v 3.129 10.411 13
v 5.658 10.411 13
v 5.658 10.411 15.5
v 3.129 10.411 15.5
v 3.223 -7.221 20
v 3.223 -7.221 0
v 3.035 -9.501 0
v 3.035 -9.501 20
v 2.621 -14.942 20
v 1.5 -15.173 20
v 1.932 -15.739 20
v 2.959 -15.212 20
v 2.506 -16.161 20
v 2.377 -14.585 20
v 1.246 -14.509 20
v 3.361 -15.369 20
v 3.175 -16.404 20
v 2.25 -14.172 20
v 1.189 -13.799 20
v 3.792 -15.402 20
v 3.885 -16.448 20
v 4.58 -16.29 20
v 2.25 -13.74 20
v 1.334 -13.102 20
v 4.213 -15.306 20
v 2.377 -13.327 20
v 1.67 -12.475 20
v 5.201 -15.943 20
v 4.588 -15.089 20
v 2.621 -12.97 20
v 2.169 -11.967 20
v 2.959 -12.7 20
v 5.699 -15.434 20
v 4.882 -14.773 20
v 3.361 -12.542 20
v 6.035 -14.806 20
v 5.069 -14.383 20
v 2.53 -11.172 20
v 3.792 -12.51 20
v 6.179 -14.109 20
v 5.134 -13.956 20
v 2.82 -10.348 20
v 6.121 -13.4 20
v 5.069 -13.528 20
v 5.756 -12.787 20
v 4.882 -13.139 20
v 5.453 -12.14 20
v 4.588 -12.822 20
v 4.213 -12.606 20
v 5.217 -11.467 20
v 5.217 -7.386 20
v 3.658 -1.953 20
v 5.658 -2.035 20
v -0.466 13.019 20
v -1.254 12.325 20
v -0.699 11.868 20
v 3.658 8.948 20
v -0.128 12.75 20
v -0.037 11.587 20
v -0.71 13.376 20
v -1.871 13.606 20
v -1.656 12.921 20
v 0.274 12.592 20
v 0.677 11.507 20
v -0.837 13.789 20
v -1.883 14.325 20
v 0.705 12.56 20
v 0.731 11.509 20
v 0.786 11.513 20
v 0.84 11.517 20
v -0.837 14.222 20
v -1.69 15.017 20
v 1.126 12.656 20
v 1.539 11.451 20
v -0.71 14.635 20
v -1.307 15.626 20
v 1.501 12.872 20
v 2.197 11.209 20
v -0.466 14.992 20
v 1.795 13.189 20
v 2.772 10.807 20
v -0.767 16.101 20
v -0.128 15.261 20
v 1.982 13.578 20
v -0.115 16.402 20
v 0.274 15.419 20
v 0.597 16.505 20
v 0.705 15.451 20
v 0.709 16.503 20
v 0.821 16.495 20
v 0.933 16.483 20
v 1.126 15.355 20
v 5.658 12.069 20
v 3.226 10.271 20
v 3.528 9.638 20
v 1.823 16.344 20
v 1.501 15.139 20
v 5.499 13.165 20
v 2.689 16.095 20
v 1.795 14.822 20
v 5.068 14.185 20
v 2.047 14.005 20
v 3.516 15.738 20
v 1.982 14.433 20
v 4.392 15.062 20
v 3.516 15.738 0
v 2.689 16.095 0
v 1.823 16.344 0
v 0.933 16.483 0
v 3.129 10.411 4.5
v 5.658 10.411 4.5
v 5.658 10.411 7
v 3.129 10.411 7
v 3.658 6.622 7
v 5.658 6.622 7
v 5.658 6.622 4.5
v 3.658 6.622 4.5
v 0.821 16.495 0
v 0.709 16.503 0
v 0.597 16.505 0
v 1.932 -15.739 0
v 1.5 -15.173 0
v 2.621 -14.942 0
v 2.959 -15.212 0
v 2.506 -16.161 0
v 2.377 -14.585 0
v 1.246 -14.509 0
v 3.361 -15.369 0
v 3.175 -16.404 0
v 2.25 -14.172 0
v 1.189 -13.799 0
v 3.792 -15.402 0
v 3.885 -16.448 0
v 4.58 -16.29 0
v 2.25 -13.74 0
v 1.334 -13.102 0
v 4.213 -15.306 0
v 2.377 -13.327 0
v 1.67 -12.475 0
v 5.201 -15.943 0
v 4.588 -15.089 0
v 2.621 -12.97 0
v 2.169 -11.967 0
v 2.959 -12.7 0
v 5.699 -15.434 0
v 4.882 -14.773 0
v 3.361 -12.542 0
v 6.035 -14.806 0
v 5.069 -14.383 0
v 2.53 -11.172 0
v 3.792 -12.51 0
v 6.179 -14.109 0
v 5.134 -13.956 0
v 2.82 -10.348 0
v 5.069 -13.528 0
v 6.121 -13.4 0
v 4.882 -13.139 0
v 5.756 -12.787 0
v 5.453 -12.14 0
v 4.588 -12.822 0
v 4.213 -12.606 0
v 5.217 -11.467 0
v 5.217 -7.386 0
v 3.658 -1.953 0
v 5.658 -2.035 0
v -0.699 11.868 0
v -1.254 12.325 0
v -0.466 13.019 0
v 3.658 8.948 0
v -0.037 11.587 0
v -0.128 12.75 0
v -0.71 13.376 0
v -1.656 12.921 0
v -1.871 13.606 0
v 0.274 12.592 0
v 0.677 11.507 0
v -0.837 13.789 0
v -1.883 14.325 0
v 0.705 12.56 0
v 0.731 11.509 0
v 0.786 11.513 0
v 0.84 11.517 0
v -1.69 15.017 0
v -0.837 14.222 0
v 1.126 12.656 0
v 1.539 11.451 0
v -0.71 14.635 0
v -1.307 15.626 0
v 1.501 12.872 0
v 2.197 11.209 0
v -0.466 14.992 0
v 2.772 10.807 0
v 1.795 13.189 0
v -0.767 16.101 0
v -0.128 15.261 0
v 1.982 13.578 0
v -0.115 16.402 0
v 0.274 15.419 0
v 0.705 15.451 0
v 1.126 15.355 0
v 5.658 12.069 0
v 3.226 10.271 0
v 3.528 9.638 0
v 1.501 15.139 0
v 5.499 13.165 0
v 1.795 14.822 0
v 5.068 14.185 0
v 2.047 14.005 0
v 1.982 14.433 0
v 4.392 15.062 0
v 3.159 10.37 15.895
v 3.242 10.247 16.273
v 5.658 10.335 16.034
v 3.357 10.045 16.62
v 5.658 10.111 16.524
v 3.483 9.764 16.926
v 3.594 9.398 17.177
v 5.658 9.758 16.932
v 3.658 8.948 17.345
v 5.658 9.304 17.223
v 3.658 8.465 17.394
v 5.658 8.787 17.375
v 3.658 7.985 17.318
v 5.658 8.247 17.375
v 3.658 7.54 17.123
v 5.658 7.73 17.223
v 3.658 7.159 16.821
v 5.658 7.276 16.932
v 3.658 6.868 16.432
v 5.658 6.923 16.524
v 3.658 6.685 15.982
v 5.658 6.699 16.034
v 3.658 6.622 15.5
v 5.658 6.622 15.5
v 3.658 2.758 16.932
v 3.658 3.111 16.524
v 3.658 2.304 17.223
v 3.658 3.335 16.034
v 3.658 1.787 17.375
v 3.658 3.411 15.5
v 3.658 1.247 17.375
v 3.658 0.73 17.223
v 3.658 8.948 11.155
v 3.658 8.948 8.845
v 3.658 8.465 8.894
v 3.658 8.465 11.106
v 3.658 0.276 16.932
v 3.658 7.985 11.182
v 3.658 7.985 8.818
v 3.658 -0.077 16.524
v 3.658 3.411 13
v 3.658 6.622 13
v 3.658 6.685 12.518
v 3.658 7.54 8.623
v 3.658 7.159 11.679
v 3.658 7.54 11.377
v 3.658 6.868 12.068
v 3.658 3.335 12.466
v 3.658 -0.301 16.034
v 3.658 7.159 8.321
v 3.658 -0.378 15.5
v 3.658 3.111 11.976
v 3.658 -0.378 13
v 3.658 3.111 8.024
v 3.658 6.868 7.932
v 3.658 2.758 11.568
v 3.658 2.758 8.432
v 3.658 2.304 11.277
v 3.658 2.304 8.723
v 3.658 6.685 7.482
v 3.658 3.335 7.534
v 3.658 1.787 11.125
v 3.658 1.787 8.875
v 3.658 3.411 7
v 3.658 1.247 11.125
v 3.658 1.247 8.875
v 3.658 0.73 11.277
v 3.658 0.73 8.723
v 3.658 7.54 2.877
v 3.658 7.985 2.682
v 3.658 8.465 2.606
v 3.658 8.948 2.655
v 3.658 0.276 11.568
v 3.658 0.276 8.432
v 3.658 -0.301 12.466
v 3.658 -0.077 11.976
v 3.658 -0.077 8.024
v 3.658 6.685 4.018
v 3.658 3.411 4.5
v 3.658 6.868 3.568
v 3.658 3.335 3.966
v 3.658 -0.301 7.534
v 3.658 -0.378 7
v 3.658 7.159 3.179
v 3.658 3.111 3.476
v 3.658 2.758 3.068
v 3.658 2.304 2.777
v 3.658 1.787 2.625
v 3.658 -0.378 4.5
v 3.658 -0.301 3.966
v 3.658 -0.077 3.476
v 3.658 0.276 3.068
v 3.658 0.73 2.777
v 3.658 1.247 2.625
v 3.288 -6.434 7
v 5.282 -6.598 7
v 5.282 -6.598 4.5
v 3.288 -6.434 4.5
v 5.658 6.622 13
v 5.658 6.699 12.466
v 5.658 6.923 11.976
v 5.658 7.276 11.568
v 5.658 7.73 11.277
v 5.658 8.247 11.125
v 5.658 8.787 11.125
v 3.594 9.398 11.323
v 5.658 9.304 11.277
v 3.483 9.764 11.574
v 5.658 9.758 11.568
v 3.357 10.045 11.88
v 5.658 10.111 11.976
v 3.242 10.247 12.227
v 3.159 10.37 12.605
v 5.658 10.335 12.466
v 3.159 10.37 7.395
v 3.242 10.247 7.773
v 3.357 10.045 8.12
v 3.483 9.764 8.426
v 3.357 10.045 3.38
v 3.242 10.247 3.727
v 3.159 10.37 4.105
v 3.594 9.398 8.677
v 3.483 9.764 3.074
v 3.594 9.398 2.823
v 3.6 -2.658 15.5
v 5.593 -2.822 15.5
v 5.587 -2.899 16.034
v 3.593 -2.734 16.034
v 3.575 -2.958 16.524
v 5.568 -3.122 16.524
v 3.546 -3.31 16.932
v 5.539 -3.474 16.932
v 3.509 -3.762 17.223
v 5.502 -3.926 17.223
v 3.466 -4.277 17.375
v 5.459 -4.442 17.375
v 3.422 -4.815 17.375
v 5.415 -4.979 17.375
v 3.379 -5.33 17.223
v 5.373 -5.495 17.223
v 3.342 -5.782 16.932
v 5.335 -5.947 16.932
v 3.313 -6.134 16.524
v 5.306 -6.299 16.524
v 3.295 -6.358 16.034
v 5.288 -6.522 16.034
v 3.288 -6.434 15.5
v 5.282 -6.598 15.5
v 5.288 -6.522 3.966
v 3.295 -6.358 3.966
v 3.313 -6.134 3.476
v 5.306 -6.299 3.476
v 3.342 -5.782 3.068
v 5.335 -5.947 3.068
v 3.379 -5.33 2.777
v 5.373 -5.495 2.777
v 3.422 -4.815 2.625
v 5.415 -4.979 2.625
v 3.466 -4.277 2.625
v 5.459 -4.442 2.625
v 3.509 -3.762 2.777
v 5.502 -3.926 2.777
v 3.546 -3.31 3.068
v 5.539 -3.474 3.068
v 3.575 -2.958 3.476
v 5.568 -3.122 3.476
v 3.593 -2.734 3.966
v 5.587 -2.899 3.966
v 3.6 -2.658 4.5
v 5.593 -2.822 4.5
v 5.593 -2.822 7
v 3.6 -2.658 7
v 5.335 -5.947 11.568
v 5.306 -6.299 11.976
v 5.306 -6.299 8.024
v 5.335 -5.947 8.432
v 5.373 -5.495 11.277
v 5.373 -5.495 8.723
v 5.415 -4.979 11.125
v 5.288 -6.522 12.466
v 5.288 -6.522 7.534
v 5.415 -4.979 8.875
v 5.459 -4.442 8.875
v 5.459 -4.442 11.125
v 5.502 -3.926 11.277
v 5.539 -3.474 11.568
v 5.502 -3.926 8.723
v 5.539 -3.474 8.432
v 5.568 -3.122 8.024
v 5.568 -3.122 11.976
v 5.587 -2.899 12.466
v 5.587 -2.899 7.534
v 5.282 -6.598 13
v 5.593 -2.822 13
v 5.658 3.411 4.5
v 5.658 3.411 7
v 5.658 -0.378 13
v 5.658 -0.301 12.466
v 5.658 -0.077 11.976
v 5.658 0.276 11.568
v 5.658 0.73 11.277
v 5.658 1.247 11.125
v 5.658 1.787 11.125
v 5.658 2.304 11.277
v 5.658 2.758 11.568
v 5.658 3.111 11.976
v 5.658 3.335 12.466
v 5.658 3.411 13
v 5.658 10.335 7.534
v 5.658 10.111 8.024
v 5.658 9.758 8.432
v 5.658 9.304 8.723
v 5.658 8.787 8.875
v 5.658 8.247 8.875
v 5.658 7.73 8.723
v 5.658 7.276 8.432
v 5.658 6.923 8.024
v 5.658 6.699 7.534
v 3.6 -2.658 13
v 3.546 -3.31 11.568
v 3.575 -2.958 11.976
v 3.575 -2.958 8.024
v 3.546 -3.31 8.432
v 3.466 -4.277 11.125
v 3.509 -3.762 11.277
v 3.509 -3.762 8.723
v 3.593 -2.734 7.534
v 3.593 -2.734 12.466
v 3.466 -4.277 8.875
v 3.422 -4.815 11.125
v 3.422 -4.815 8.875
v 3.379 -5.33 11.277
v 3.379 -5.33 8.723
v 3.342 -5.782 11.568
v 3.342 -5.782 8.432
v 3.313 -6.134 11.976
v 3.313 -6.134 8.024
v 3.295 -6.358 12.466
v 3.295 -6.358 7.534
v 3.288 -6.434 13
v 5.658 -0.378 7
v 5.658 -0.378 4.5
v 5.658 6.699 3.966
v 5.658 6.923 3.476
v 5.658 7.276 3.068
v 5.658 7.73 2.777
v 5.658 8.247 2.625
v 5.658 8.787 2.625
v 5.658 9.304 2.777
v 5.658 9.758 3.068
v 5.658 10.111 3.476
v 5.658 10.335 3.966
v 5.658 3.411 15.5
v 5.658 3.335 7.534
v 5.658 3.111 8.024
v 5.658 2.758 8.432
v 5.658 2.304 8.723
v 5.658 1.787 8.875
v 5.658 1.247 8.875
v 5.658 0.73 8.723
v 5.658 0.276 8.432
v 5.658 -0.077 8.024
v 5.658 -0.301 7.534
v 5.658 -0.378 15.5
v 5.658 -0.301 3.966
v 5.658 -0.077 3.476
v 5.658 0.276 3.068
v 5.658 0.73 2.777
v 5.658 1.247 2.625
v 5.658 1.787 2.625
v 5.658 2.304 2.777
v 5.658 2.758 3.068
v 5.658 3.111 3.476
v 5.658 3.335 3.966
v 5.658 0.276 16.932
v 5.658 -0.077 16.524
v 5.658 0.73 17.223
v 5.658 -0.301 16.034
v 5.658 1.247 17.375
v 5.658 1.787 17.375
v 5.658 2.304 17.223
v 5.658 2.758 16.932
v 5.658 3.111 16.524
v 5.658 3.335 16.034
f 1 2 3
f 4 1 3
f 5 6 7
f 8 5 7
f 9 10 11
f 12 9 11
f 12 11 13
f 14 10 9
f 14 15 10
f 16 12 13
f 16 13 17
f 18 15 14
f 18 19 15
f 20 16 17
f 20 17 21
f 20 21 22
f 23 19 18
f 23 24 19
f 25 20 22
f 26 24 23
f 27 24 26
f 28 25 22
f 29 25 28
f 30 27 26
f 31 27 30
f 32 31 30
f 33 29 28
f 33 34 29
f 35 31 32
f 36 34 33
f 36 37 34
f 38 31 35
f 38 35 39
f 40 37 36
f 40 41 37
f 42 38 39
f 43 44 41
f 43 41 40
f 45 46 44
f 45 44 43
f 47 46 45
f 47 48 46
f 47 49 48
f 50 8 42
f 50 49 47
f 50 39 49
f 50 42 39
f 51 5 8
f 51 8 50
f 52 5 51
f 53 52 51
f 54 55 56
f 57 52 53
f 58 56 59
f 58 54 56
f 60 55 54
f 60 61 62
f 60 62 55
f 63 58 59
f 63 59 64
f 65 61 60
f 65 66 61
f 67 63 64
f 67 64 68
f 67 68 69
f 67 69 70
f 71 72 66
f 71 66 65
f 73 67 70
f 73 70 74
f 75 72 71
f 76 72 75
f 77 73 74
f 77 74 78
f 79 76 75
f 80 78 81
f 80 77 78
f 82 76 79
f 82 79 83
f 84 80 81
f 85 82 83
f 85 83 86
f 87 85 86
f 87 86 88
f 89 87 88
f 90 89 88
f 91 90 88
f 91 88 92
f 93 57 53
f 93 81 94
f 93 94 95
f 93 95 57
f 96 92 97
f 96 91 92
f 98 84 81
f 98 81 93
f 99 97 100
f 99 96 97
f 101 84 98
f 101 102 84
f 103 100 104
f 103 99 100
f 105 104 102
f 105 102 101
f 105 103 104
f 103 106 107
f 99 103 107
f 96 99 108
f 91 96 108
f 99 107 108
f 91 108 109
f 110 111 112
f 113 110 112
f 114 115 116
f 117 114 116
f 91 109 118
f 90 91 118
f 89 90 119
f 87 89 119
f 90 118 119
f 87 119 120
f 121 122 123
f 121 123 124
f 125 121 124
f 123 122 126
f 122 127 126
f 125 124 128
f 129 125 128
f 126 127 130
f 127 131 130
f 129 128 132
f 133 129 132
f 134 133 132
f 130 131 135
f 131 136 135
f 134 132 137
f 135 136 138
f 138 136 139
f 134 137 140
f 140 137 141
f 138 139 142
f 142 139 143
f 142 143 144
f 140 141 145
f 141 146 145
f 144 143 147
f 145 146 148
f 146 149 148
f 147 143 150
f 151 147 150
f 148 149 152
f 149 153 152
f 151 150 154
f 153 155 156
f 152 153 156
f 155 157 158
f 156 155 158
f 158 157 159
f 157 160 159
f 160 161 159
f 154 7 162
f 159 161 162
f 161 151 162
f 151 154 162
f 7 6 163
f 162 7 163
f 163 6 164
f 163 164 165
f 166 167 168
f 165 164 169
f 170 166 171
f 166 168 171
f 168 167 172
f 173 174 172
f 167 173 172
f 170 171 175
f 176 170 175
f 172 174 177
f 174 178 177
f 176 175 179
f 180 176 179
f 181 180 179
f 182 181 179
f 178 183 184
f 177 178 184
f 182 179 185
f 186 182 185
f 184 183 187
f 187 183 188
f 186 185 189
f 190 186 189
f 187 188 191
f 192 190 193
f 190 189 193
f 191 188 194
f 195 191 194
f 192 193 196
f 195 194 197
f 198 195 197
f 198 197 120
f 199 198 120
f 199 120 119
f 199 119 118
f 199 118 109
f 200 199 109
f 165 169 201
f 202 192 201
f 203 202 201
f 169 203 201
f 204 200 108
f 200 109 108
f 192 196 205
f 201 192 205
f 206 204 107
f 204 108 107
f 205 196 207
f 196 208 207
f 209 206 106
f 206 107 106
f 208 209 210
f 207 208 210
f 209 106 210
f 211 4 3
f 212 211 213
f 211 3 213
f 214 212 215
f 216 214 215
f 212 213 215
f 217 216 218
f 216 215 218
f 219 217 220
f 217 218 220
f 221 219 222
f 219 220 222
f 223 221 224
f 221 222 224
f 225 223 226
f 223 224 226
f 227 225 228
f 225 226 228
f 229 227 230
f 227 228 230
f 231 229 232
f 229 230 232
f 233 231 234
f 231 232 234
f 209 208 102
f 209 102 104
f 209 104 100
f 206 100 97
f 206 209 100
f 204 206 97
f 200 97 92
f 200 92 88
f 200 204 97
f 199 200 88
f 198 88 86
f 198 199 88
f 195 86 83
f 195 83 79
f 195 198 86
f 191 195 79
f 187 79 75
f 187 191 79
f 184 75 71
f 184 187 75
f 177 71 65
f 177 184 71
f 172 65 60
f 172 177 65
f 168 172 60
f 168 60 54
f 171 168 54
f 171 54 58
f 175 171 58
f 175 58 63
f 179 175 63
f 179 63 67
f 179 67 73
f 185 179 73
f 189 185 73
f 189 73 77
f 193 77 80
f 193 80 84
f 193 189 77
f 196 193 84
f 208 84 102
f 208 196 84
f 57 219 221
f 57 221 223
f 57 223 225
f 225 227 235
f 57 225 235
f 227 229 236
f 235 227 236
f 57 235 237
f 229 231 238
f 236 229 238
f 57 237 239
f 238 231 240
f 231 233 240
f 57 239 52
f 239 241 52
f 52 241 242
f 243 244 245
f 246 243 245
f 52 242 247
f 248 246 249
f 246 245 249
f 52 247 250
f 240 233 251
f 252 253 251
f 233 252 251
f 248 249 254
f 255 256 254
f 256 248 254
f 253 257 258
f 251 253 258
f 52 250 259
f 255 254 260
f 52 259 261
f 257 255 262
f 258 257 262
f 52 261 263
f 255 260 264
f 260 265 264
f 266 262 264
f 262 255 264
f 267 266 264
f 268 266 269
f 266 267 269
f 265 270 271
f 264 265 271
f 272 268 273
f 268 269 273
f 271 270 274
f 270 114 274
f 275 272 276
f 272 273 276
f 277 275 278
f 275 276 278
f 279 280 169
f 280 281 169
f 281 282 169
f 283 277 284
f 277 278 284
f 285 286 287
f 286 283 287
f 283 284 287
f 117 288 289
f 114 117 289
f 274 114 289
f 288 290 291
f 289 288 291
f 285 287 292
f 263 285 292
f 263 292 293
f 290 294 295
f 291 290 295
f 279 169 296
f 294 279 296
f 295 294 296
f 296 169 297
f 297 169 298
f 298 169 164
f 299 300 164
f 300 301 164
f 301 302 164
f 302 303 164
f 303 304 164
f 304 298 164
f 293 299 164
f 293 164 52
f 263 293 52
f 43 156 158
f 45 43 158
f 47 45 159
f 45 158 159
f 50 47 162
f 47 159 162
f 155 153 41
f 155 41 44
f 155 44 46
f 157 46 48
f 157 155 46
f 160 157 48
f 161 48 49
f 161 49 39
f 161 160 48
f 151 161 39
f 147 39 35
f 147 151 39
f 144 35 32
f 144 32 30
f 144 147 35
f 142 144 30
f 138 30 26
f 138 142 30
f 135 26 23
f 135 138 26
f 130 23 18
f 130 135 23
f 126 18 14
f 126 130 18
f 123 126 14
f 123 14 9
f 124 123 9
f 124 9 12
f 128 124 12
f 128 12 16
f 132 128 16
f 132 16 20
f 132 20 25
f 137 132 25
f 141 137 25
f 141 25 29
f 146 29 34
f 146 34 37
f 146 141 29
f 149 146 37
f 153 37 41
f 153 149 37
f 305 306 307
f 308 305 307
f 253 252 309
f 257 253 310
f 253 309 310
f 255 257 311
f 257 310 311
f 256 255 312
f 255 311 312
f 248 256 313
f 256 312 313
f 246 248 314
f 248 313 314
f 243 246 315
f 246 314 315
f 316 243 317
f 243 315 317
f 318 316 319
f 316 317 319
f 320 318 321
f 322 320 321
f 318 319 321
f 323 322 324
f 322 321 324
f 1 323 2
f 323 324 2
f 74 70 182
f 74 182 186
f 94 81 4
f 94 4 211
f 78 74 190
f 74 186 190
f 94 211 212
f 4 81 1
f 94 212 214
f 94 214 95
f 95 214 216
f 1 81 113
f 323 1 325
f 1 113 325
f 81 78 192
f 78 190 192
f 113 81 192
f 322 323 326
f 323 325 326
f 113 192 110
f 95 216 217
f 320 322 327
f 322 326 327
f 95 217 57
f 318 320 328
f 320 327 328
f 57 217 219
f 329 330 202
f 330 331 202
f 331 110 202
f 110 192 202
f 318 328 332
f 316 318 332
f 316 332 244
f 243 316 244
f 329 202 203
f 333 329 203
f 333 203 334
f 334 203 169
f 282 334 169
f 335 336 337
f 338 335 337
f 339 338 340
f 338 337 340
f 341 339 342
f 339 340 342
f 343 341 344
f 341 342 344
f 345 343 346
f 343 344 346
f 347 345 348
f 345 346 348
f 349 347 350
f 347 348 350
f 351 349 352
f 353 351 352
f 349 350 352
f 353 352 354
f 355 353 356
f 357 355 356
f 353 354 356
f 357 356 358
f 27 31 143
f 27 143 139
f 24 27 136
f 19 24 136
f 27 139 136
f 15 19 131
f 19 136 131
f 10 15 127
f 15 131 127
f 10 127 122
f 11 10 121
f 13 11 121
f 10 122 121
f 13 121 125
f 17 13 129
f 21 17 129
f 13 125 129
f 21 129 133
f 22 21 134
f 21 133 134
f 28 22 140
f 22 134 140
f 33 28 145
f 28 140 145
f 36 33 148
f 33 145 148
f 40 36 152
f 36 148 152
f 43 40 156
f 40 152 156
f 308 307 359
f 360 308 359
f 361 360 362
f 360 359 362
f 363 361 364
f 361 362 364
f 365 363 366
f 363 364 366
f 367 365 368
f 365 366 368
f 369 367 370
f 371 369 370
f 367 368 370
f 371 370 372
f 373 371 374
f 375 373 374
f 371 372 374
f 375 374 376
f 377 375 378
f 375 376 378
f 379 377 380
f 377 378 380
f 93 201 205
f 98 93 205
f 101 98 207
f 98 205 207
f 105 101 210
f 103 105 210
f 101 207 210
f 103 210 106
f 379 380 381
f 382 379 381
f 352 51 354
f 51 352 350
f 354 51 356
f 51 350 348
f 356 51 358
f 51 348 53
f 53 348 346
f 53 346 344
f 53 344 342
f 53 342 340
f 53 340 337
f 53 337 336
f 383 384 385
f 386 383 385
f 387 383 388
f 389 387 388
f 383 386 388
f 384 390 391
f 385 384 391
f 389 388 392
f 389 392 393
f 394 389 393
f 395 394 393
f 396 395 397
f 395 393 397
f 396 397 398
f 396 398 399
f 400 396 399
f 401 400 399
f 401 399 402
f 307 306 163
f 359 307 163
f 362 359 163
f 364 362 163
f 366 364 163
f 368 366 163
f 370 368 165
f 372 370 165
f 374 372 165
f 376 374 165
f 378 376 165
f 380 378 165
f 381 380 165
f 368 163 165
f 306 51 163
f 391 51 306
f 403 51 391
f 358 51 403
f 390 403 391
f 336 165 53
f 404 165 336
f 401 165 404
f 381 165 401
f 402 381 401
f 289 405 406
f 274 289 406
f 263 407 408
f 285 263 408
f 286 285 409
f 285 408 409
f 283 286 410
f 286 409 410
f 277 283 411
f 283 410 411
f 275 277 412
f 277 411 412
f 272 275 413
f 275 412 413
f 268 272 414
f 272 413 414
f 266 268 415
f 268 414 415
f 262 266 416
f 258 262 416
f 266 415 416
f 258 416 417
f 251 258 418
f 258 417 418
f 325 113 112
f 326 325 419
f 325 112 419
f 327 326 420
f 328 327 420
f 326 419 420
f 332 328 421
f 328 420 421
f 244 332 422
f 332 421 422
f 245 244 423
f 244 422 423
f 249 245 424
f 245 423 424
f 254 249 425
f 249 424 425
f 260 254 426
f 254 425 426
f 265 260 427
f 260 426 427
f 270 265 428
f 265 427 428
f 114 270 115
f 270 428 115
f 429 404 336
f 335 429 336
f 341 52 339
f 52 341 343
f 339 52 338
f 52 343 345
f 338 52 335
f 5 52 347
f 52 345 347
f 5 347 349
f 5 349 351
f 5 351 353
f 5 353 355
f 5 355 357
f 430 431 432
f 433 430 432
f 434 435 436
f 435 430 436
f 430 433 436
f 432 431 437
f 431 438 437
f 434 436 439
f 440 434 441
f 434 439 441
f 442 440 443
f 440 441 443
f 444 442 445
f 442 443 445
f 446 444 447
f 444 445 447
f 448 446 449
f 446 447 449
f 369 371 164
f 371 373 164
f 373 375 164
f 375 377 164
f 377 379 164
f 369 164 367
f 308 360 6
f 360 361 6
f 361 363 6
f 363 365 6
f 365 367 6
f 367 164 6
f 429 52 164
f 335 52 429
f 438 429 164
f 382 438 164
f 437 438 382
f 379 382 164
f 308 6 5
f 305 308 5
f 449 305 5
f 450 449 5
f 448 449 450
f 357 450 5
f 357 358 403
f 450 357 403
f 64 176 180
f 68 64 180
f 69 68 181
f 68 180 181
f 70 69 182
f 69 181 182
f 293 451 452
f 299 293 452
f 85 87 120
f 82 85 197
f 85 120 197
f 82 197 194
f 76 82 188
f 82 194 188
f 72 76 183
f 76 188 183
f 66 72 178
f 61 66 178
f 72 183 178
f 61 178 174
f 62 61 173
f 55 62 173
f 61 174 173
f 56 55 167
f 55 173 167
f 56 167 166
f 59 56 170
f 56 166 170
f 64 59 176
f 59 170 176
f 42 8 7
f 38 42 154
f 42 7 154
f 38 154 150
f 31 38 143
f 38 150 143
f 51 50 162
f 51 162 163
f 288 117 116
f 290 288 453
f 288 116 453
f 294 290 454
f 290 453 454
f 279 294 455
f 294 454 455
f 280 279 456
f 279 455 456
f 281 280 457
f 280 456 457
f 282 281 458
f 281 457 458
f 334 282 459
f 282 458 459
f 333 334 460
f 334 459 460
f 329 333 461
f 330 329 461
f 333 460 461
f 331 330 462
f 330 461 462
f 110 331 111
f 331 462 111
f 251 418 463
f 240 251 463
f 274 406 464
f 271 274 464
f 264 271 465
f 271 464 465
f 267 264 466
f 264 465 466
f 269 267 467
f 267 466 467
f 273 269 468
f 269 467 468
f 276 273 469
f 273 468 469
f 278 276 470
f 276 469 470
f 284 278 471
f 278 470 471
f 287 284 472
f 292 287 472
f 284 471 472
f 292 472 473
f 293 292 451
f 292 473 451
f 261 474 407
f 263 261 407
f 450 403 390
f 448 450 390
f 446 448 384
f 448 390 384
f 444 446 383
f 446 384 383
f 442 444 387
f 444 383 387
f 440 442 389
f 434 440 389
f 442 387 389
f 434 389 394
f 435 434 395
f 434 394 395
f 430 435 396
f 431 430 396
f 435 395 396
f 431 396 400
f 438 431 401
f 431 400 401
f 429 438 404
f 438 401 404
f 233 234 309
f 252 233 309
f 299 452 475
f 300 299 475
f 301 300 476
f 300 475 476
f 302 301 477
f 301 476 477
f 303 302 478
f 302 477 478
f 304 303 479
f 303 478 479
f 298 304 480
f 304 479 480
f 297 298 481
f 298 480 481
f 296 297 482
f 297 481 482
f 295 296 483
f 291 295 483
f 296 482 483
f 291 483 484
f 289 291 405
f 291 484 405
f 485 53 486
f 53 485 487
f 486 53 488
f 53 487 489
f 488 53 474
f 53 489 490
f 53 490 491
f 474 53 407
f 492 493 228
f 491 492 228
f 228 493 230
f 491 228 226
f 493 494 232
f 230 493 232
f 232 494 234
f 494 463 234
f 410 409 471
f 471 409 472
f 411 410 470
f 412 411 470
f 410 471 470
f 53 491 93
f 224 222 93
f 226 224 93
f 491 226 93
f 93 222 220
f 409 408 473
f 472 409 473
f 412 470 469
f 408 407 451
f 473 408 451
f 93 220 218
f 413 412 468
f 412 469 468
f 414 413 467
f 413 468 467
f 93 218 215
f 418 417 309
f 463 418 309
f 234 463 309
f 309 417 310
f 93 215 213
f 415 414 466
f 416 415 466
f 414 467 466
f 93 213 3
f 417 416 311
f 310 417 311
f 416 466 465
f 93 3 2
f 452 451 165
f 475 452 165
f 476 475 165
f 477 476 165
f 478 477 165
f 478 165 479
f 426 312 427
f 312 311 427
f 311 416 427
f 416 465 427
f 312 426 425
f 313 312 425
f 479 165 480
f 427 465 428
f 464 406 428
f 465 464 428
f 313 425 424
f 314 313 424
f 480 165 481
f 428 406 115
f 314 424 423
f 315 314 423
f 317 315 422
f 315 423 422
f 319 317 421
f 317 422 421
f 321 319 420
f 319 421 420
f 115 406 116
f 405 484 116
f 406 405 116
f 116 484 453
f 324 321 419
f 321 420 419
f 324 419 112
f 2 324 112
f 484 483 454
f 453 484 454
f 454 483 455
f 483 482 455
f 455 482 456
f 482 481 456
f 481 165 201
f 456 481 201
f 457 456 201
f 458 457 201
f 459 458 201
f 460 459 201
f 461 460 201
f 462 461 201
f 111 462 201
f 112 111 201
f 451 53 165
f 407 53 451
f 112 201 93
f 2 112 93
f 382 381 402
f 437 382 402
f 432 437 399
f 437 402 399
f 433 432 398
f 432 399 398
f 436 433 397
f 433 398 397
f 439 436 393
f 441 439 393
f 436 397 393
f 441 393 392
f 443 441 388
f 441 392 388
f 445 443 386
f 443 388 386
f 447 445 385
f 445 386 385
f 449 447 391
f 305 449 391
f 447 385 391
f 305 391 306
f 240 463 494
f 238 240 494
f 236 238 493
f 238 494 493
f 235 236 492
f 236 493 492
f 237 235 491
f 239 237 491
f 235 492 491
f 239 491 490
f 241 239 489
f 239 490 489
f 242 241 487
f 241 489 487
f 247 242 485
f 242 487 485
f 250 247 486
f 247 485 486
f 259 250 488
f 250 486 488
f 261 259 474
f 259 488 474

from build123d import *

# Parameters (mm, degrees)
F0_R     = 1.45
F1_DEPTH = 20
F3_DEPTH = 25
F5_DEPTH = 25


# Not quite as in the source:
# - a feature names something its author has since deleted; it is built from what else it names


with BuildPart() as f1:
    # F0 (on Top) → F1 (new body)
    with BuildSketch(Plane.XY):
        with BuildLine():
            Line((5.2166173299, -7.3856279958), (5.6577173299, -2.0351279958))
            Line((5.6577173299, -2.0351279958), (5.6577173299, 12.0690828189))
            ThreePointArc((5.6577173299, 12.0690828189), (5.068252548, 14.1845927754), (3.5162961604, 15.7383889255))
            ThreePointArc((3.5162961604, 15.7383889255), (2.260074285, 16.2332107279), (0.9331621041, 16.4827023722))
            ThreePointArc((0.9331621041, 16.4827023722), (2.4795483886, 15.6499153849), (3.0965173299, 14.0054720042))
            ThreePointArc((3.0965173299, 14.0054720042), (2.4482954337, 12.3259131769), (0.8397830463, 11.5173357959))
            ThreePointArc((0.8397830463, 11.5173357959), (2.7724359809, 10.8070477652), (3.6577173299, 8.9480336756))
            Line((3.6577173299, 8.9480336756), (3.6577173299, -1.9528267058))
            Line((3.6577173299, -1.9528267058), (3.2233793816, -7.2213036786))
            Line((3.2233793816, -7.2213036786), (3.0354523847, -9.5008398307))
            ThreePointArc((3.0354523847, -9.5008398307), (2.6844675314, -10.7628559885), (2.1688231186, -11.9670096287))
            ThreePointArc((2.1688231186, -11.9670096287), (2.8315798002, -16.3061539408), (6.1209868425, -13.3997435963))
            ThreePointArc((6.1209868425, -13.3997435963), (5.5965527788, -12.467225095), (5.2166173299, -11.4670896557))
            Line((5.2166173299, -11.4670896557), (5.2166173299, -7.3856279958))
        make_face()
        with Locations((3.6836173299, -13.9558279958)):
            Circle(F0_R, mode=Mode.SUBTRACT)
        with BuildLine():
            ThreePointArc((0.5965173299, 16.5054720042), (0.7649742372, 16.4960760435), (0.9331621041, 16.4827023722))
            ThreePointArc((0.9331621041, 16.4827023722), (0.7652242949, 16.4997731007), (0.5965173299, 16.5054720042))
        make_face()
        with BuildLine():
            ThreePointArc((3.0965173299, 14.0054720042), (2.4795483886, 15.6499153849), (0.9331621041, 16.4827023722))
            ThreePointArc((0.9331621041, 16.4827023722), (0.7649742372, 16.4960760435), (0.5965173299, 16.5054720042))
            ThreePointArc((0.5965173299, 16.5054720042), (-1.903159389, 13.9652687601), (0.6769134206, 11.5067650449))
            ThreePointArc((0.6769134206, 11.5067650449), (0.7582691412, 11.5132690403), (0.8397830463, 11.5173357959))
            ThreePointArc((0.8397830463, 11.5173357959), (2.4482954337, 12.3259131769), (3.0965173299, 14.0054720042))
        make_face()
        with Locations((0.5965173299, 14.0054720042)):
            Circle(F0_R, mode=Mode.SUBTRACT)
        with BuildLine():
            ThreePointArc((0.6769134206, 11.5067650449), (0.7584345203, 11.5107209498), (0.8397830463, 11.5173357959))
            ThreePointArc((0.8397830463, 11.5173357959), (0.7582691412, 11.5132690403), (0.6769134206, 11.5067650449))
        make_face()
    extrude(amount=F1_DEPTH)

    # F2 (on face) → F3 (cut)
    with BuildSketch(Plane.YZ.offset(5.6577173299)):
        with BuildLine():
            Line((3.4114552828, 13), (3.4114552828, 15.5))
            ThreePointArc((3.4114552828, 15.5), (1.5169774116, 17.3944778712), (-0.3775004597, 15.5))
            Line((-0.3775004597, 15.5), (-0.3775004597, 13))
            ThreePointArc((-0.3775004597, 13), (1.5169774116, 11.1055221288), (3.4114552828, 13))
        make_face()
        with BuildLine():
            Line((6.6224995403, 7), (6.6224995403, 4.5))
            ThreePointArc((6.6224995403, 4.5), (8.5169774116, 2.6055221288), (10.4114552828, 4.5))
            Line((10.4114552828, 4.5), (10.4114552828, 7))
            ThreePointArc((10.4114552828, 7), (8.5169774116, 8.8944778712), (6.6224995403, 7))
        make_face()
        with BuildLine():
            ThreePointArc((10.4114552828, 15.5), (8.5169774116, 17.3944778712), (6.6224995403, 15.5))
            Line((6.6224995403, 15.5), (6.6224995403, 13))
            ThreePointArc((6.6224995403, 13), (8.5169774116, 11.1055221288), (10.4114552828, 13))
            Line((10.4114552828, 13), (10.4114552828, 15.5))
        make_face()
        with BuildLine():
            ThreePointArc((-0.3775004597, 4.5), (1.5169774116, 2.6055221288), (3.4114552828, 4.5))
            Line((3.4114552828, 4.5), (3.4114552828, 7))
            ThreePointArc((3.4114552828, 7), (1.5169774116, 8.8944778712), (-0.3775004597, 7))
            Line((-0.3775004597, 7), (-0.3775004597, 4.5))
        make_face()
    extrude(amount=-F3_DEPTH, mode=Mode.SUBTRACT)

    # F4 (on face) → F5 (cut)
    with BuildSketch(Plane(origin=(5.7861693945, -0.4770169741, 0), x_dir=(0.0821621586, 0.9966189742, 0), z_dir=(0.9966189742, -0.0821621586, 0))):
        with BuildLine():
            ThreePointArc((-2.3532448105, 15.5), (-4.2477226817, 17.3944778712), (-6.142200553, 15.5))
            Line((-6.142200553, 15.5), (-6.142200553, 13))
            ThreePointArc((-6.142200553, 13), (-4.2477226817, 11.1055221288), (-2.3532448105, 13))
            Line((-2.3532448105, 13), (-2.3532448105, 15.5))
        make_face()
        with BuildLine():
            ThreePointArc((-6.142200553, 4.5), (-4.2477226817, 2.6055221288), (-2.3532448105, 4.5))
            Line((-2.3532448105, 4.5), (-2.3532448105, 7))
            ThreePointArc((-2.3532448105, 7), (-4.2477226817, 8.8944778712), (-6.142200553, 7))
            Line((-6.142200553, 7), (-6.142200553, 4.5))
        make_face()
    extrude(amount=-F5_DEPTH, mode=Mode.SUBTRACT)


solid = f1.part
